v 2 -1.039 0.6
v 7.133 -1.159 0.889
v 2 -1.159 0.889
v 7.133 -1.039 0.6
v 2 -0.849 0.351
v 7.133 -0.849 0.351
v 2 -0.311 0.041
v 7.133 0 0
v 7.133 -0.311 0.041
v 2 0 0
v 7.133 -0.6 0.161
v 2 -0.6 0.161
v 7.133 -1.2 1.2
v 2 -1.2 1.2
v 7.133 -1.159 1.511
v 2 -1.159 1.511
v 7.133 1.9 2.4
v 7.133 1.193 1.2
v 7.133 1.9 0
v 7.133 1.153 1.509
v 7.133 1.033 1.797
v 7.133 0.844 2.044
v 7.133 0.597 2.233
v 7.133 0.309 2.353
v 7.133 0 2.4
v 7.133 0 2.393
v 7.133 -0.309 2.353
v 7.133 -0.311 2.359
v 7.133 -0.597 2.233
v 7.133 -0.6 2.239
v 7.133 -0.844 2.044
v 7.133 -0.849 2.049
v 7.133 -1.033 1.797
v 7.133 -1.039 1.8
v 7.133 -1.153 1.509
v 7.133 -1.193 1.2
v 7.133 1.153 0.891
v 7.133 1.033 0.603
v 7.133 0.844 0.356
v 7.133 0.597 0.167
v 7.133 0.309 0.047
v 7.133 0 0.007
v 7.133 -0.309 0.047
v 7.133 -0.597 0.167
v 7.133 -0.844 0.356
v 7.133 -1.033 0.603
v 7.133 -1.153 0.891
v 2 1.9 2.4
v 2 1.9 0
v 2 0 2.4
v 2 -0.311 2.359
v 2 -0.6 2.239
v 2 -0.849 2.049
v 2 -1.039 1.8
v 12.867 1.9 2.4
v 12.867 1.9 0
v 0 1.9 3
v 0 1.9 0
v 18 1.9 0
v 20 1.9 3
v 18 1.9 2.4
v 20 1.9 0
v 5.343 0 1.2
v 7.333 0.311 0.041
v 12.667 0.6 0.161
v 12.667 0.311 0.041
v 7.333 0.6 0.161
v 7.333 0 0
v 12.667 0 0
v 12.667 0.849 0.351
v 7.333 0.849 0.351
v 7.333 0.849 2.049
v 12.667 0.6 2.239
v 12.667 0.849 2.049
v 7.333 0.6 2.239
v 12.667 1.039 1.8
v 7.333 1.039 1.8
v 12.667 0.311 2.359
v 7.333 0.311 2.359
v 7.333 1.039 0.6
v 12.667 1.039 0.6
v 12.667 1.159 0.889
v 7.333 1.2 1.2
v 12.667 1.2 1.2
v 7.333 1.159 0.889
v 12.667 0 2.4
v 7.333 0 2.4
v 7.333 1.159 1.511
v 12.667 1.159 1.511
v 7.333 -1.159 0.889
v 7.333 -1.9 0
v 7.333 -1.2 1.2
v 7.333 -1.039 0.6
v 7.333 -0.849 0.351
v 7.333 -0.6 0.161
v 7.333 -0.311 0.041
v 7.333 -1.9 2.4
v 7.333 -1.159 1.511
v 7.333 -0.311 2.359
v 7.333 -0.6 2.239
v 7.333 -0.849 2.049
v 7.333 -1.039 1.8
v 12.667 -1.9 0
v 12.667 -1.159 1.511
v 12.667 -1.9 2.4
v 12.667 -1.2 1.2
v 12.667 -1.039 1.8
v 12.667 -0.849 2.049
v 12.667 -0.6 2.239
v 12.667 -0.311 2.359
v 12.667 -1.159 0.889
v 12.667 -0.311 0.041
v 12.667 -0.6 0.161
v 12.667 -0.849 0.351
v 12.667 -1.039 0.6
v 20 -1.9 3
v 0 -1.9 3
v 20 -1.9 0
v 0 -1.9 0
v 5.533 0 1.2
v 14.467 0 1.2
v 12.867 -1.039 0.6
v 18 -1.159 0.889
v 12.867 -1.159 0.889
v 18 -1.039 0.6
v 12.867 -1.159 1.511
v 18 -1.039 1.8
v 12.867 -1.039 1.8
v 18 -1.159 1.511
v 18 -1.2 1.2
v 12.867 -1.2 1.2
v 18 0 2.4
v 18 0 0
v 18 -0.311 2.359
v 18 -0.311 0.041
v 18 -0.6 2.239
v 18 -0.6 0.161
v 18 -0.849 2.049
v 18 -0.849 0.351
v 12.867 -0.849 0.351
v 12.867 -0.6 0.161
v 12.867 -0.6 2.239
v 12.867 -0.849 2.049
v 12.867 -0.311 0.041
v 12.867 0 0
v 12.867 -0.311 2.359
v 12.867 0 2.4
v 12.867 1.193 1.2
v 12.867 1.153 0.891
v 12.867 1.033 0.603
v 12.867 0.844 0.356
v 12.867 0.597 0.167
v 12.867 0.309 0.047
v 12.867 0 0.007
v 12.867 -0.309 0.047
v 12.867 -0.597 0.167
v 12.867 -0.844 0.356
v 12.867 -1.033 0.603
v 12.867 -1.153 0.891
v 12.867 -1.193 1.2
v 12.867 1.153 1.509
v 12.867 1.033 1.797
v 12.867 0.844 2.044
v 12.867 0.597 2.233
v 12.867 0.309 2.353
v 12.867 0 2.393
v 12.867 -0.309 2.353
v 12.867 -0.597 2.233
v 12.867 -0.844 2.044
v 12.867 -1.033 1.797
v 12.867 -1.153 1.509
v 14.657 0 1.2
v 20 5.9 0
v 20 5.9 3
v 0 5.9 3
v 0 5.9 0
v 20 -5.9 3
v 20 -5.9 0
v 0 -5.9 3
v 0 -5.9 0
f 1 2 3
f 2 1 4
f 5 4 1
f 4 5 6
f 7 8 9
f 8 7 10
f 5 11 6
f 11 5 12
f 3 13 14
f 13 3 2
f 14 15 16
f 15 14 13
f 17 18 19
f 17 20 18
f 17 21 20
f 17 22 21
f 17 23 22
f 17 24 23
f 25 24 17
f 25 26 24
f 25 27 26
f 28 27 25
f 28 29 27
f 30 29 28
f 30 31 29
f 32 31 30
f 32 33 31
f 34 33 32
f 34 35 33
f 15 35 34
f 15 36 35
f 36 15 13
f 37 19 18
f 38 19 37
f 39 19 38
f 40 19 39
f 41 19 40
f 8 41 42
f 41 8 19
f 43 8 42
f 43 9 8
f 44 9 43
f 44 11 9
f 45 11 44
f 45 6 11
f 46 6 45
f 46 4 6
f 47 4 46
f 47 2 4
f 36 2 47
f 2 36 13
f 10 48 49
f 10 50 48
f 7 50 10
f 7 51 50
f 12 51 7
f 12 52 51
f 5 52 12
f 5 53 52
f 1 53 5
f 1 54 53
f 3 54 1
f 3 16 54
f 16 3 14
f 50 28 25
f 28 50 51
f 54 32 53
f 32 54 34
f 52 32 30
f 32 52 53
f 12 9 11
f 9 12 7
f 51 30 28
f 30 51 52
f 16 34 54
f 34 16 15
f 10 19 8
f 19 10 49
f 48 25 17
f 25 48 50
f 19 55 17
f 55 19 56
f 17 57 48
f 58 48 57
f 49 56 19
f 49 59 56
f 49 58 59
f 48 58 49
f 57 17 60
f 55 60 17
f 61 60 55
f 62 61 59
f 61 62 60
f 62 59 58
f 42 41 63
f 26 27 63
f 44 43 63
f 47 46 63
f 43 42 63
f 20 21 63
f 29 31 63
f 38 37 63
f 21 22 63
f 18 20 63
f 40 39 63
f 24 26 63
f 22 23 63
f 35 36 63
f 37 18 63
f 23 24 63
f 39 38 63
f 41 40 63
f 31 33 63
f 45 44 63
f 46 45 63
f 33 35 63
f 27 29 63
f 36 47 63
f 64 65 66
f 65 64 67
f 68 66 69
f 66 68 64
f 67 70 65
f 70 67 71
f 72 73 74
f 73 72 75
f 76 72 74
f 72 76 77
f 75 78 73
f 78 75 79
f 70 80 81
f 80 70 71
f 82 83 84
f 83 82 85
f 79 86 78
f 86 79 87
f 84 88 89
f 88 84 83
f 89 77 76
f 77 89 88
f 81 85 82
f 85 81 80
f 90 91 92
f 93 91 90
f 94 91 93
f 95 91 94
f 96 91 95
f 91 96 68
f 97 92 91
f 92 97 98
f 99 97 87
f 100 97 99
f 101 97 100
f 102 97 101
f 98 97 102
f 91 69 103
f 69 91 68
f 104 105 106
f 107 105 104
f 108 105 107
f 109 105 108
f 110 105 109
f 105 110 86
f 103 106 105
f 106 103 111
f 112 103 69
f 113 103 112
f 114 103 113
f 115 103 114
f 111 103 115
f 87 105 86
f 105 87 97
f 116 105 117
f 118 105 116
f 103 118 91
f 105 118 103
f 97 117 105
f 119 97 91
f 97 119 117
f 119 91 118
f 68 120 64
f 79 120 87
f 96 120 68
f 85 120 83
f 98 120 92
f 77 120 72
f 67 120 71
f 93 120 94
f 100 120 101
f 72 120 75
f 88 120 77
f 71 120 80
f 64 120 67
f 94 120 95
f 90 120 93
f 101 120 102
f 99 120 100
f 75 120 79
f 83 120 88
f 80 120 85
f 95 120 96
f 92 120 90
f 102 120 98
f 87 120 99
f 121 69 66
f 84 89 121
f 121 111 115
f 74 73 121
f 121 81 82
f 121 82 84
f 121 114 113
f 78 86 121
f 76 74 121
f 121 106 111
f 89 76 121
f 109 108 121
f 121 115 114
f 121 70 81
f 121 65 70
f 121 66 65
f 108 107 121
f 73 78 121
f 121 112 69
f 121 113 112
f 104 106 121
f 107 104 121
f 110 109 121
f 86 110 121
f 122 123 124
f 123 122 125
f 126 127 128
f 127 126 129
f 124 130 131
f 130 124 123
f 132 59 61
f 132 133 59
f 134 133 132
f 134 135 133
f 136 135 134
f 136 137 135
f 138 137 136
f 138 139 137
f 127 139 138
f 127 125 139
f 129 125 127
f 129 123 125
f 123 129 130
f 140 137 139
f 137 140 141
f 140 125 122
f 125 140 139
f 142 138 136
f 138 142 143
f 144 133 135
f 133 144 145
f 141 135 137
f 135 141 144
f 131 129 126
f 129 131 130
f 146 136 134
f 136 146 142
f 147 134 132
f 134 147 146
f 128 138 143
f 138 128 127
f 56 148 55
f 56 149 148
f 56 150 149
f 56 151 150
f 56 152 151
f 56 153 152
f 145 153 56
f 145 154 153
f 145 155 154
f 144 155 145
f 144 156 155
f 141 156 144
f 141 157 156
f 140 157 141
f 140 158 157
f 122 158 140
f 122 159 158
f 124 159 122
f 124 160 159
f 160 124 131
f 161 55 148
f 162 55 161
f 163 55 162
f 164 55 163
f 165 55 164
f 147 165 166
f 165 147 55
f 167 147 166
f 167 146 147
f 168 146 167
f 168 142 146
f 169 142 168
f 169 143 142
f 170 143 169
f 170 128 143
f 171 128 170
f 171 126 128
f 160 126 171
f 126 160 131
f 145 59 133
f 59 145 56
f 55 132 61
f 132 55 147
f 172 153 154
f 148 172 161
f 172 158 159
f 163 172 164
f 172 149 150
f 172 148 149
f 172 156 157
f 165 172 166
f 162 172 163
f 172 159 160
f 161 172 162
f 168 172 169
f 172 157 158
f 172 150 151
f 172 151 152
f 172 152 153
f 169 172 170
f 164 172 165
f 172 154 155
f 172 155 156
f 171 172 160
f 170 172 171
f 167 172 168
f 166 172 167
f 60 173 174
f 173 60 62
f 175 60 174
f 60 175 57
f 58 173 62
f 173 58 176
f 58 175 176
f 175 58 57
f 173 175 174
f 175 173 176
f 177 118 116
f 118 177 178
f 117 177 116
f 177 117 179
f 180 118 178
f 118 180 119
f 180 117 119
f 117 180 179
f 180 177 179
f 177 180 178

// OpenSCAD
module mathhinge(){
// mathgrrl cone hinge

//////////////////////////////////////////////////////
// parameters

// Length of the complete hinge
length = 20;

// Height (diameter) of the hinge
height = 3;

// Clearance between cones and holes
clearance = .2;		

// Clearance between hinge and sides
gap = .7; 				

// Parameters that the user does not get to specify
$fn=24*1;
border = 2*1; 
fudge = .01*1;			// to preserve mesh integrity
corner = 2*1;      	// space between hinge and corner
hinge_radius = height/2.5;
cone_height = 1.5*hinge_radius;  

//////////////////////////////////////////////////////
// renders

rotate(90,[0,1,0]) 
	translate([-hinge_radius,0,0])
		hinge();

translate([0,hinge_radius+gap,0]) bar();
translate([0,-2*border-hinge_radius-gap,0]) bar();

//translate([0,hinge_radius+gap,0]) square();
//translate([0,-length-hinge_radius-gap,0]) square();


//////////////////////////////////////////////////////
// module for hinge

module hinge(){
	rad = hinge_radius;
	clr = clearance;
	len = (length-2*corner)/3; 
	con = cone_height;
	// left outside hinge = (cylinder+box)-cone
	difference(){
		union(){
			translate([0,0,corner]) cylinder(h=len-clr,r=rad);
			translate([-rad,0,corner]) cube([2*rad,rad+gap,len-clr]);
		}
		translate([0,0,corner+len-con-clr+fudge]) cylinder(h=con,r1=0,r2=rad);
	}
	// inside hinge = cylinder+box+cone+cone
	union(){
		translate([0,0,corner+len]) cylinder(h=len,r=rad);
		translate([-rad,-rad-gap,corner+len]) cube([2*rad,rad+gap,len]);
		translate([0,0,corner+len-con]) cylinder(h=con,r1=0,r2=rad);
		translate([0,0,corner+2*len]) cylinder(h=con,r1=rad,r2=0);
	}
	// right outside hinge = (cylinder+box)-cone
	difference(){
		union(){
			translate([0,0,corner+2*len+clr]) cylinder(h=len-clr,r=rad);
			translate([-rad,0,corner+2*len+clr]) cube([2*rad,rad+gap,len-clr]);
		}
		translate([0,0,corner+2*len+clr-fudge]) cylinder(h=con,r1=rad,r2=0);	
	}
}

//////////////////////////////////////////////////////
// module for square shape

module square(){
	difference(){
		cube([length,length,height]);
		translate([border,border,-fudge])
			cube(	[length-2*border,length-2*border,height+2*fudge]);
	}
}

//////////////////////////////////////////////////////
// module for bar shape

module bar(){
	cube([length,2*border,height]);
}
}
mathhinge();
